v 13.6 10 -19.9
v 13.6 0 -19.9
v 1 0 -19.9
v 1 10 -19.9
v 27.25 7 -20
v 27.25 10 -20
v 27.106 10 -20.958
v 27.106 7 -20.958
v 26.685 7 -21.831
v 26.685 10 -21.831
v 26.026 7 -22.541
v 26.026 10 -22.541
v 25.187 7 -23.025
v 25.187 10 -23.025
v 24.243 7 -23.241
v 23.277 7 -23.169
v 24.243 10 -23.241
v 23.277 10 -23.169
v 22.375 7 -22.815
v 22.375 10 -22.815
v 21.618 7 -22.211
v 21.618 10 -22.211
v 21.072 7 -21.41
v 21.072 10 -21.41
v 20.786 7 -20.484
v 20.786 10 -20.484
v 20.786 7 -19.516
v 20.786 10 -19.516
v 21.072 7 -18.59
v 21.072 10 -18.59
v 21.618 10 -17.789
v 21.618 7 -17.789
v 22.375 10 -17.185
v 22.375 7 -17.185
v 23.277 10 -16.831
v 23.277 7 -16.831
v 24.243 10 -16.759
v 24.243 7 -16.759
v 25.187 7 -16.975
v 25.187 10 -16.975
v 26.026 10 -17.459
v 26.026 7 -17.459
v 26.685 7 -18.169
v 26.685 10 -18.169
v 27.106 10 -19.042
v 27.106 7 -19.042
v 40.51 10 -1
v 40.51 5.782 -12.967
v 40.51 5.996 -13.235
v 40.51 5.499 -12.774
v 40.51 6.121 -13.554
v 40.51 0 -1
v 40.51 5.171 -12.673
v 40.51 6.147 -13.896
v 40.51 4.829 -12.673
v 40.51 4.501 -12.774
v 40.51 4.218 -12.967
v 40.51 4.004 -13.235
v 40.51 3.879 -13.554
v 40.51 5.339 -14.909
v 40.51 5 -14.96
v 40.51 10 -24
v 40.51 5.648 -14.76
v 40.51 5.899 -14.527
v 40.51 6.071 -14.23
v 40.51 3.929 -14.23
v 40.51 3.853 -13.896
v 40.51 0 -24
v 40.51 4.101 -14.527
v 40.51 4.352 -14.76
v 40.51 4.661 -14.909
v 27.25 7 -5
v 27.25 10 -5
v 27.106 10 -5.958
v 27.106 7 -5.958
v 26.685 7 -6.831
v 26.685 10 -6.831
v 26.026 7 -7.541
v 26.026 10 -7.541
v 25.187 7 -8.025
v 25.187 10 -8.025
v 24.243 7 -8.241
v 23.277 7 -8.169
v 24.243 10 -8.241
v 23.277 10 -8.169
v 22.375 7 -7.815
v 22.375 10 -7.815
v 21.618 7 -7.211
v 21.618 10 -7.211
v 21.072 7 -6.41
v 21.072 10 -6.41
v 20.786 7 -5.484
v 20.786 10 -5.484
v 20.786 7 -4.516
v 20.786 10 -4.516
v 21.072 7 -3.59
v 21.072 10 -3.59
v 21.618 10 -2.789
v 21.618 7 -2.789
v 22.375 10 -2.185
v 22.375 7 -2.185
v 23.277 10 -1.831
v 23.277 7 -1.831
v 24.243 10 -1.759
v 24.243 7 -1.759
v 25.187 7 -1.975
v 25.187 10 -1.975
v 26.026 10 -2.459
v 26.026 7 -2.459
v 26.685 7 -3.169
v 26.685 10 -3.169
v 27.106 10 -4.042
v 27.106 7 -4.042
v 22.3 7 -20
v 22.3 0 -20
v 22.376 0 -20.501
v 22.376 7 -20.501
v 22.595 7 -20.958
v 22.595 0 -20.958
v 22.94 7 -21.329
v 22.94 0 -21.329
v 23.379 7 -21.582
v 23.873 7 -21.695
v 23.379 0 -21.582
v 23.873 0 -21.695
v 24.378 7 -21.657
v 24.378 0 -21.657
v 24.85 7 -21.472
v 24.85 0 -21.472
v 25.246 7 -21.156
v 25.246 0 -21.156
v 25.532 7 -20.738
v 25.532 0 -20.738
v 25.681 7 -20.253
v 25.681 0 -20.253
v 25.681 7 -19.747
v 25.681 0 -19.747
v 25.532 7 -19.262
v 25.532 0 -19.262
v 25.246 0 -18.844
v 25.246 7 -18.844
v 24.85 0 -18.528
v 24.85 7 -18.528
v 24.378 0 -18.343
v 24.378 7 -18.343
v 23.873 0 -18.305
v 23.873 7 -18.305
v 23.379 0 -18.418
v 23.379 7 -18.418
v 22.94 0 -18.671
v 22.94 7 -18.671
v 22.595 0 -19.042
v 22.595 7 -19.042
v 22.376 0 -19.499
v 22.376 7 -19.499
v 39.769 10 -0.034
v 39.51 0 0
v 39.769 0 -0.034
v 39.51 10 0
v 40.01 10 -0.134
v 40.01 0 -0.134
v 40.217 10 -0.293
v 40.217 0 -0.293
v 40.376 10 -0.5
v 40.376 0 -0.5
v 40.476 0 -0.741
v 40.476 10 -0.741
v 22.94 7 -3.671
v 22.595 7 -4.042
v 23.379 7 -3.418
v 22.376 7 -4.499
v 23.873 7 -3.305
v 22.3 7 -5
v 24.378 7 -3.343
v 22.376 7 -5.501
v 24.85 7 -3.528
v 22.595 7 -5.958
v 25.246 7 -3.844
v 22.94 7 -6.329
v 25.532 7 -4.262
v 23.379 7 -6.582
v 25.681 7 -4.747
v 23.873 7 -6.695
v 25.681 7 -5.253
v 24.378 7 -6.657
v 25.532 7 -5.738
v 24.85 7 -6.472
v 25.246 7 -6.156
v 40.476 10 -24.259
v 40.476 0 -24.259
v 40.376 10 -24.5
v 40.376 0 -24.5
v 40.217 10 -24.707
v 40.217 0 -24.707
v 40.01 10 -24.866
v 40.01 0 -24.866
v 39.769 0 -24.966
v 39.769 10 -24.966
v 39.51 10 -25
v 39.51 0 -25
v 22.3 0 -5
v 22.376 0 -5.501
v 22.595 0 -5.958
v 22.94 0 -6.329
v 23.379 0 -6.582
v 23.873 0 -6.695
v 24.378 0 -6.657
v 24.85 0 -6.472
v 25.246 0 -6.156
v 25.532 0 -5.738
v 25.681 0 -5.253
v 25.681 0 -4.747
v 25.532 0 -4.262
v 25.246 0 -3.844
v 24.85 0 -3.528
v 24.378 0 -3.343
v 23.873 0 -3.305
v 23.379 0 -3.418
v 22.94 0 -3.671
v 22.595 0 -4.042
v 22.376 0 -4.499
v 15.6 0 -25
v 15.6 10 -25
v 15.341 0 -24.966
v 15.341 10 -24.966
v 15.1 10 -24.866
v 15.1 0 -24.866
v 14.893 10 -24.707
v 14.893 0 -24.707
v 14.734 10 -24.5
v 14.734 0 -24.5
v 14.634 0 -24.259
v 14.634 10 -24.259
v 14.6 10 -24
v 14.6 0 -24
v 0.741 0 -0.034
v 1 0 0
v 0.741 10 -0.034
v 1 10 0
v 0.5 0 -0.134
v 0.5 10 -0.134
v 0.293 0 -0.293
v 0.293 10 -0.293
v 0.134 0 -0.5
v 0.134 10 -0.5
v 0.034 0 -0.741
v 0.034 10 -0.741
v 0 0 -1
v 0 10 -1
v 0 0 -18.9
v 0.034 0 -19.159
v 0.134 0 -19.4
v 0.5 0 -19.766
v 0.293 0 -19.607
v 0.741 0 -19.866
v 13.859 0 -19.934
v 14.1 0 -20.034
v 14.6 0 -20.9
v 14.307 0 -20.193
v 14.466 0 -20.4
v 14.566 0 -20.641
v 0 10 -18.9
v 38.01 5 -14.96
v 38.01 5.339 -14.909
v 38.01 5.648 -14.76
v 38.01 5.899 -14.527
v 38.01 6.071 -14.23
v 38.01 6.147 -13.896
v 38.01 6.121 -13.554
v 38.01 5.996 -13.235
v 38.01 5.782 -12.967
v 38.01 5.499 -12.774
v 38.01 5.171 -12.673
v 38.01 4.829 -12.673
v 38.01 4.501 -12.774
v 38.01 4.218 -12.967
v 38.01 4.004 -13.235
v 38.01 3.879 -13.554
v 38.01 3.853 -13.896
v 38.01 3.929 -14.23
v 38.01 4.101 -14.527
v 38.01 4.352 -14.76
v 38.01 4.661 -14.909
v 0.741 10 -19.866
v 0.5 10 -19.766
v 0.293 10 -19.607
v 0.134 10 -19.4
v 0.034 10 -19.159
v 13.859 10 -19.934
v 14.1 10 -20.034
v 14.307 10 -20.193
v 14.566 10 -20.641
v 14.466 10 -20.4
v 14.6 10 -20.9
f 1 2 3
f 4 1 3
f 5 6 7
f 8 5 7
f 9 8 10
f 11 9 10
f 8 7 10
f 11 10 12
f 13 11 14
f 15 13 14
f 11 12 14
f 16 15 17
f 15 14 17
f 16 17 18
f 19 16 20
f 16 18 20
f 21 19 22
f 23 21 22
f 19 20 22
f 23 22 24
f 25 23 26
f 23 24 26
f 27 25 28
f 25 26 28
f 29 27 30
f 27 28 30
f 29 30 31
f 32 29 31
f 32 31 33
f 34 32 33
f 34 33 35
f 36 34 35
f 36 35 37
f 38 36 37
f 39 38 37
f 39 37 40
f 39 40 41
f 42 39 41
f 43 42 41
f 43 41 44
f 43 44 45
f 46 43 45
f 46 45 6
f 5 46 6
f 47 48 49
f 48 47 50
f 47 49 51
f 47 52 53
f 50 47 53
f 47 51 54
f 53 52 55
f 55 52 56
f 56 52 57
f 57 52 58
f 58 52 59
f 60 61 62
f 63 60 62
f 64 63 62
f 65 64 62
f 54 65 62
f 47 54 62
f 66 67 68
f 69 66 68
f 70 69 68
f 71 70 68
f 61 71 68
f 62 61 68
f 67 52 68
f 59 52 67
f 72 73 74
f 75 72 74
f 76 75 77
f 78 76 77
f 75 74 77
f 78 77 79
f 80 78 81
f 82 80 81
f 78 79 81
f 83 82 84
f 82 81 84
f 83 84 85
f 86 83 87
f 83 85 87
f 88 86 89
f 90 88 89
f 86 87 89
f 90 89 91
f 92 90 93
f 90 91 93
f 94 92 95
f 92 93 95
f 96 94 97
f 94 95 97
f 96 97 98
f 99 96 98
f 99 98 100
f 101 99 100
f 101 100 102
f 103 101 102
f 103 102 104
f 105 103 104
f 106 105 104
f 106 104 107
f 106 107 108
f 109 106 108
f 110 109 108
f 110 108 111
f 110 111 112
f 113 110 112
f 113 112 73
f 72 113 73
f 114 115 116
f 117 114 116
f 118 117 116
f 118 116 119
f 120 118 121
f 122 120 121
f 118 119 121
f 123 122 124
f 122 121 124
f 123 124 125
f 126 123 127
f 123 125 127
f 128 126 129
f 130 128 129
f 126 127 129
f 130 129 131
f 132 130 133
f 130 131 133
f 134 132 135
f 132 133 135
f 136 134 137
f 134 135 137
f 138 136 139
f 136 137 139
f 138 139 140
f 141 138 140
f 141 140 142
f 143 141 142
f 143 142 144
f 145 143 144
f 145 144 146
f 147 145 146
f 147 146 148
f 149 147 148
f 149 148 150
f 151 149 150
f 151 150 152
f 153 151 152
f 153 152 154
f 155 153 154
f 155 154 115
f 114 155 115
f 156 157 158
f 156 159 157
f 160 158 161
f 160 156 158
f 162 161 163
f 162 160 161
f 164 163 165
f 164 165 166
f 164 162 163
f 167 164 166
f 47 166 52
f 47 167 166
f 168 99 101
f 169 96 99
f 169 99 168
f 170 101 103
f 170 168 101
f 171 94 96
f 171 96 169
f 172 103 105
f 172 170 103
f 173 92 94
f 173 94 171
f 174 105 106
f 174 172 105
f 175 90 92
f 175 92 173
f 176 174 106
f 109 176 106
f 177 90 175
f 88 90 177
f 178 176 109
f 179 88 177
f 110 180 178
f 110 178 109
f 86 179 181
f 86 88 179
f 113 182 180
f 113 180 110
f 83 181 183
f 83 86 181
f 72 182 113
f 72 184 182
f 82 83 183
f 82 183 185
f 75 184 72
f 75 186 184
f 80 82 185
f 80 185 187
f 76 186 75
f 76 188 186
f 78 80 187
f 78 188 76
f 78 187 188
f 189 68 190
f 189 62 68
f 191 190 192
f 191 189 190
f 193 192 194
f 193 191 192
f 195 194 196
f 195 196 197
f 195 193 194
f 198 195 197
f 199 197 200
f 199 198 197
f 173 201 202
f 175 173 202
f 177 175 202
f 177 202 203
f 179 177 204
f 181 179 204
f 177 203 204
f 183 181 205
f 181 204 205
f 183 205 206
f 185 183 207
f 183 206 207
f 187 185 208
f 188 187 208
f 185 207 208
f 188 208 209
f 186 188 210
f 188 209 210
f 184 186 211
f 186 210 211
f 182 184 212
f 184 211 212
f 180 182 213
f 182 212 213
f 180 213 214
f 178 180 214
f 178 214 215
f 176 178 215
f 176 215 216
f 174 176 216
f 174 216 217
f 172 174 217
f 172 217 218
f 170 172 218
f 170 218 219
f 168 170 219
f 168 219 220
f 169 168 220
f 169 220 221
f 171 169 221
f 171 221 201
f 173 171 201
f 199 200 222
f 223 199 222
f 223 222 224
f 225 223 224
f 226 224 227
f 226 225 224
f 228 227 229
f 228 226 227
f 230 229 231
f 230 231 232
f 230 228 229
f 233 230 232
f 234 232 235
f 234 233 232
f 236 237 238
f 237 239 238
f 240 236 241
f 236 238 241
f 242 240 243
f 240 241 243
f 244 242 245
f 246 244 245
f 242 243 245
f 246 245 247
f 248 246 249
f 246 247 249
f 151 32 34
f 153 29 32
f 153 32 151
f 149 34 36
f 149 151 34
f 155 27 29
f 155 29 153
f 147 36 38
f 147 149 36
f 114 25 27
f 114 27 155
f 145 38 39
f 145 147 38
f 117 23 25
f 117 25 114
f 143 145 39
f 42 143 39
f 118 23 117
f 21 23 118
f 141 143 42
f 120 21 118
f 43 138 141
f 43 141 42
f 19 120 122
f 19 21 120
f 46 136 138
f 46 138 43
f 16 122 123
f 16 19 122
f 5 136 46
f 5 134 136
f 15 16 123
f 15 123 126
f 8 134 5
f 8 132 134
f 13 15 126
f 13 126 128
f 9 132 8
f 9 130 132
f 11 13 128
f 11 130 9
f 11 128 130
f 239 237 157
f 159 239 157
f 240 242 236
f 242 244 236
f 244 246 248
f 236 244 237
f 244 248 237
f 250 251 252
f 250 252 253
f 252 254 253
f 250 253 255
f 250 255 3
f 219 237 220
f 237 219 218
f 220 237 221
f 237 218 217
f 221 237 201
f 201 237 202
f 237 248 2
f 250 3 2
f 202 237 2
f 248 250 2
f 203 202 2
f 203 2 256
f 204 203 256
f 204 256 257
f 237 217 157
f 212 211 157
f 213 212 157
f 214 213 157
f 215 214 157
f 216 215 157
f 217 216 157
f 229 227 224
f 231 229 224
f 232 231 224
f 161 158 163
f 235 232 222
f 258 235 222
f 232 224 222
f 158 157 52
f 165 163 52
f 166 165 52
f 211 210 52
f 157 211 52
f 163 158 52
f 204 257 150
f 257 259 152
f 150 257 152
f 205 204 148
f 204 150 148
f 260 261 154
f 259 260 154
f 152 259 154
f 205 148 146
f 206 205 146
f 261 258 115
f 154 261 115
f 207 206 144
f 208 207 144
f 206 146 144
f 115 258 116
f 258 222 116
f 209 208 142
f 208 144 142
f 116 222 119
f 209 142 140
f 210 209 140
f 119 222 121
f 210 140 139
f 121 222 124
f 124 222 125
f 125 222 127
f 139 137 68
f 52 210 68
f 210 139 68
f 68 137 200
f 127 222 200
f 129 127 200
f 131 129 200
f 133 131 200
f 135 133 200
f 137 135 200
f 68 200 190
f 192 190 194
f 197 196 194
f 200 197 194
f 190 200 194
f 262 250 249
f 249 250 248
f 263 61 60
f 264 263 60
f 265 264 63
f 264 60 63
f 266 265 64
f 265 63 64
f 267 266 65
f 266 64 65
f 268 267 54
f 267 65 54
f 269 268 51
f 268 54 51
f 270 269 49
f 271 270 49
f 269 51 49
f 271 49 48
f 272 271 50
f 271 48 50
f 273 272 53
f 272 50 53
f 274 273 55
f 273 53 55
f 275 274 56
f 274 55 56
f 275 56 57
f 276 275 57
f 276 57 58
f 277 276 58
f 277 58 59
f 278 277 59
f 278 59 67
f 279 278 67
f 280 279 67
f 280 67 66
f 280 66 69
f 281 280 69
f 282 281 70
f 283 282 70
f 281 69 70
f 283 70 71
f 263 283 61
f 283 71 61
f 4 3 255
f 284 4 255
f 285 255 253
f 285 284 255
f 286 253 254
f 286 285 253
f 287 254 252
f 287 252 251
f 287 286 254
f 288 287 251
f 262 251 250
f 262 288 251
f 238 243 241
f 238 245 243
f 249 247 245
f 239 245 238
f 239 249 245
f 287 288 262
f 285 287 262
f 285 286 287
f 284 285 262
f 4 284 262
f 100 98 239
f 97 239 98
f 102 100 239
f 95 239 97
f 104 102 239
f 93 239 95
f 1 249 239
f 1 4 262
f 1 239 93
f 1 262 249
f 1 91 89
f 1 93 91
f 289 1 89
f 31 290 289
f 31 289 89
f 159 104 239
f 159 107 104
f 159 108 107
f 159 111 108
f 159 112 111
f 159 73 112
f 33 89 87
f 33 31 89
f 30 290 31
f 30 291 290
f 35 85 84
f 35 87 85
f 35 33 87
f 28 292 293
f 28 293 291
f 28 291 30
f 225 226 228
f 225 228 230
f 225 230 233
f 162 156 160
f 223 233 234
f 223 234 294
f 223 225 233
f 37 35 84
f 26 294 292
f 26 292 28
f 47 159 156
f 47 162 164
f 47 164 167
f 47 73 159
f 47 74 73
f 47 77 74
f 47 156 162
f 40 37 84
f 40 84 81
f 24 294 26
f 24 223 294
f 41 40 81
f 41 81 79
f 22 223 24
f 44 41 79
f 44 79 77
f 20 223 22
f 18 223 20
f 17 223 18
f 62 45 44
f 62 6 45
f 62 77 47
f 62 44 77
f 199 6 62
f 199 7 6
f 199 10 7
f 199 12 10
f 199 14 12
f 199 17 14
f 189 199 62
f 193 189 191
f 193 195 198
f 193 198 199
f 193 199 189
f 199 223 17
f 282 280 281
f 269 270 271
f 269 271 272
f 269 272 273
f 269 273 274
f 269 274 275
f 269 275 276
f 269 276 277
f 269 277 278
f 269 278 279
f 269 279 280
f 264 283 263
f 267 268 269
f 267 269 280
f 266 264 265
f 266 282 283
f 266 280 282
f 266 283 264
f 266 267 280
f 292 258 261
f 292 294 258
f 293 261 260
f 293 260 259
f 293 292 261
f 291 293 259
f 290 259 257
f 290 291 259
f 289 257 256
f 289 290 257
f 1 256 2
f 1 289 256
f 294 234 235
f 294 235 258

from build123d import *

# Parameters (mm, degrees)
BOSS_EXTRUDE1_DEPTH            = 10
FILLET1_R                      = 1
CBORE_FOR_M3_SHCS1_D           = 3.4
CBORE_FOR_M3_SHCS1_DEPTH       = 10
CBORE_FOR_M3_SHCS1_CBORE_D     = 6.5
CBORE_FOR_M3_SHCS1_CBORE_DEPTH = 3
SKETCH5_R                      = 1.15
CUT_EXTRUDE1_DEPTH             = 2.5


with BuildPart() as part:
    # Sketch1 → Boss-Extrude1 (new body)
    with BuildSketch(Plane(origin=(0, 0, 0), x_dir=(1, 0, 0), z_dir=(0, 1, 0))):
        Polygon((0, 0), (40.51, 0), (40.51, 25), (14.6, 25), (14.6, 19.9), (0, 19.9), align=None)
    extrude(amount=BOSS_EXTRUDE1_DEPTH)

    # Fillet1
    fillet1_edges = [part.edges().sort_by_distance(p)[0] for p in [
        (0, 5, -19.9),
        (14.6, 5, -19.9),
        (14.6, 5, -25),
        (40.51, 5, -25),
        (40.51, 5, 0),
        (0, 5, 0),
    ]]
    fillet(fillet1_edges, radius=FILLET1_R)

    # CBORE for M3 SHCS1
    with Locations(Plane(origin=(0, 10, 0), x_dir=(1, 0, 0), z_dir=(0, 1, 0))):
        with Locations((24, 20), (24, 5)):
            CounterBoreHole(CBORE_FOR_M3_SHCS1_D / 2, CBORE_FOR_M3_SHCS1_CBORE_D / 2, CBORE_FOR_M3_SHCS1_CBORE_DEPTH, depth=CBORE_FOR_M3_SHCS1_DEPTH)

    # Sketch5 → Cut-Extrude1 (cut, symmetric)
    with BuildSketch(Plane(origin=(40.51, 0, 0), x_dir=(0, 0, -1), z_dir=(1, 0, 0))):
        with Locations((13.81, 5)):
            Circle(SKETCH5_R)
    extrude(amount=CUT_EXTRUDE1_DEPTH, both=True, mode=Mode.SUBTRACT)


solid = part.part
